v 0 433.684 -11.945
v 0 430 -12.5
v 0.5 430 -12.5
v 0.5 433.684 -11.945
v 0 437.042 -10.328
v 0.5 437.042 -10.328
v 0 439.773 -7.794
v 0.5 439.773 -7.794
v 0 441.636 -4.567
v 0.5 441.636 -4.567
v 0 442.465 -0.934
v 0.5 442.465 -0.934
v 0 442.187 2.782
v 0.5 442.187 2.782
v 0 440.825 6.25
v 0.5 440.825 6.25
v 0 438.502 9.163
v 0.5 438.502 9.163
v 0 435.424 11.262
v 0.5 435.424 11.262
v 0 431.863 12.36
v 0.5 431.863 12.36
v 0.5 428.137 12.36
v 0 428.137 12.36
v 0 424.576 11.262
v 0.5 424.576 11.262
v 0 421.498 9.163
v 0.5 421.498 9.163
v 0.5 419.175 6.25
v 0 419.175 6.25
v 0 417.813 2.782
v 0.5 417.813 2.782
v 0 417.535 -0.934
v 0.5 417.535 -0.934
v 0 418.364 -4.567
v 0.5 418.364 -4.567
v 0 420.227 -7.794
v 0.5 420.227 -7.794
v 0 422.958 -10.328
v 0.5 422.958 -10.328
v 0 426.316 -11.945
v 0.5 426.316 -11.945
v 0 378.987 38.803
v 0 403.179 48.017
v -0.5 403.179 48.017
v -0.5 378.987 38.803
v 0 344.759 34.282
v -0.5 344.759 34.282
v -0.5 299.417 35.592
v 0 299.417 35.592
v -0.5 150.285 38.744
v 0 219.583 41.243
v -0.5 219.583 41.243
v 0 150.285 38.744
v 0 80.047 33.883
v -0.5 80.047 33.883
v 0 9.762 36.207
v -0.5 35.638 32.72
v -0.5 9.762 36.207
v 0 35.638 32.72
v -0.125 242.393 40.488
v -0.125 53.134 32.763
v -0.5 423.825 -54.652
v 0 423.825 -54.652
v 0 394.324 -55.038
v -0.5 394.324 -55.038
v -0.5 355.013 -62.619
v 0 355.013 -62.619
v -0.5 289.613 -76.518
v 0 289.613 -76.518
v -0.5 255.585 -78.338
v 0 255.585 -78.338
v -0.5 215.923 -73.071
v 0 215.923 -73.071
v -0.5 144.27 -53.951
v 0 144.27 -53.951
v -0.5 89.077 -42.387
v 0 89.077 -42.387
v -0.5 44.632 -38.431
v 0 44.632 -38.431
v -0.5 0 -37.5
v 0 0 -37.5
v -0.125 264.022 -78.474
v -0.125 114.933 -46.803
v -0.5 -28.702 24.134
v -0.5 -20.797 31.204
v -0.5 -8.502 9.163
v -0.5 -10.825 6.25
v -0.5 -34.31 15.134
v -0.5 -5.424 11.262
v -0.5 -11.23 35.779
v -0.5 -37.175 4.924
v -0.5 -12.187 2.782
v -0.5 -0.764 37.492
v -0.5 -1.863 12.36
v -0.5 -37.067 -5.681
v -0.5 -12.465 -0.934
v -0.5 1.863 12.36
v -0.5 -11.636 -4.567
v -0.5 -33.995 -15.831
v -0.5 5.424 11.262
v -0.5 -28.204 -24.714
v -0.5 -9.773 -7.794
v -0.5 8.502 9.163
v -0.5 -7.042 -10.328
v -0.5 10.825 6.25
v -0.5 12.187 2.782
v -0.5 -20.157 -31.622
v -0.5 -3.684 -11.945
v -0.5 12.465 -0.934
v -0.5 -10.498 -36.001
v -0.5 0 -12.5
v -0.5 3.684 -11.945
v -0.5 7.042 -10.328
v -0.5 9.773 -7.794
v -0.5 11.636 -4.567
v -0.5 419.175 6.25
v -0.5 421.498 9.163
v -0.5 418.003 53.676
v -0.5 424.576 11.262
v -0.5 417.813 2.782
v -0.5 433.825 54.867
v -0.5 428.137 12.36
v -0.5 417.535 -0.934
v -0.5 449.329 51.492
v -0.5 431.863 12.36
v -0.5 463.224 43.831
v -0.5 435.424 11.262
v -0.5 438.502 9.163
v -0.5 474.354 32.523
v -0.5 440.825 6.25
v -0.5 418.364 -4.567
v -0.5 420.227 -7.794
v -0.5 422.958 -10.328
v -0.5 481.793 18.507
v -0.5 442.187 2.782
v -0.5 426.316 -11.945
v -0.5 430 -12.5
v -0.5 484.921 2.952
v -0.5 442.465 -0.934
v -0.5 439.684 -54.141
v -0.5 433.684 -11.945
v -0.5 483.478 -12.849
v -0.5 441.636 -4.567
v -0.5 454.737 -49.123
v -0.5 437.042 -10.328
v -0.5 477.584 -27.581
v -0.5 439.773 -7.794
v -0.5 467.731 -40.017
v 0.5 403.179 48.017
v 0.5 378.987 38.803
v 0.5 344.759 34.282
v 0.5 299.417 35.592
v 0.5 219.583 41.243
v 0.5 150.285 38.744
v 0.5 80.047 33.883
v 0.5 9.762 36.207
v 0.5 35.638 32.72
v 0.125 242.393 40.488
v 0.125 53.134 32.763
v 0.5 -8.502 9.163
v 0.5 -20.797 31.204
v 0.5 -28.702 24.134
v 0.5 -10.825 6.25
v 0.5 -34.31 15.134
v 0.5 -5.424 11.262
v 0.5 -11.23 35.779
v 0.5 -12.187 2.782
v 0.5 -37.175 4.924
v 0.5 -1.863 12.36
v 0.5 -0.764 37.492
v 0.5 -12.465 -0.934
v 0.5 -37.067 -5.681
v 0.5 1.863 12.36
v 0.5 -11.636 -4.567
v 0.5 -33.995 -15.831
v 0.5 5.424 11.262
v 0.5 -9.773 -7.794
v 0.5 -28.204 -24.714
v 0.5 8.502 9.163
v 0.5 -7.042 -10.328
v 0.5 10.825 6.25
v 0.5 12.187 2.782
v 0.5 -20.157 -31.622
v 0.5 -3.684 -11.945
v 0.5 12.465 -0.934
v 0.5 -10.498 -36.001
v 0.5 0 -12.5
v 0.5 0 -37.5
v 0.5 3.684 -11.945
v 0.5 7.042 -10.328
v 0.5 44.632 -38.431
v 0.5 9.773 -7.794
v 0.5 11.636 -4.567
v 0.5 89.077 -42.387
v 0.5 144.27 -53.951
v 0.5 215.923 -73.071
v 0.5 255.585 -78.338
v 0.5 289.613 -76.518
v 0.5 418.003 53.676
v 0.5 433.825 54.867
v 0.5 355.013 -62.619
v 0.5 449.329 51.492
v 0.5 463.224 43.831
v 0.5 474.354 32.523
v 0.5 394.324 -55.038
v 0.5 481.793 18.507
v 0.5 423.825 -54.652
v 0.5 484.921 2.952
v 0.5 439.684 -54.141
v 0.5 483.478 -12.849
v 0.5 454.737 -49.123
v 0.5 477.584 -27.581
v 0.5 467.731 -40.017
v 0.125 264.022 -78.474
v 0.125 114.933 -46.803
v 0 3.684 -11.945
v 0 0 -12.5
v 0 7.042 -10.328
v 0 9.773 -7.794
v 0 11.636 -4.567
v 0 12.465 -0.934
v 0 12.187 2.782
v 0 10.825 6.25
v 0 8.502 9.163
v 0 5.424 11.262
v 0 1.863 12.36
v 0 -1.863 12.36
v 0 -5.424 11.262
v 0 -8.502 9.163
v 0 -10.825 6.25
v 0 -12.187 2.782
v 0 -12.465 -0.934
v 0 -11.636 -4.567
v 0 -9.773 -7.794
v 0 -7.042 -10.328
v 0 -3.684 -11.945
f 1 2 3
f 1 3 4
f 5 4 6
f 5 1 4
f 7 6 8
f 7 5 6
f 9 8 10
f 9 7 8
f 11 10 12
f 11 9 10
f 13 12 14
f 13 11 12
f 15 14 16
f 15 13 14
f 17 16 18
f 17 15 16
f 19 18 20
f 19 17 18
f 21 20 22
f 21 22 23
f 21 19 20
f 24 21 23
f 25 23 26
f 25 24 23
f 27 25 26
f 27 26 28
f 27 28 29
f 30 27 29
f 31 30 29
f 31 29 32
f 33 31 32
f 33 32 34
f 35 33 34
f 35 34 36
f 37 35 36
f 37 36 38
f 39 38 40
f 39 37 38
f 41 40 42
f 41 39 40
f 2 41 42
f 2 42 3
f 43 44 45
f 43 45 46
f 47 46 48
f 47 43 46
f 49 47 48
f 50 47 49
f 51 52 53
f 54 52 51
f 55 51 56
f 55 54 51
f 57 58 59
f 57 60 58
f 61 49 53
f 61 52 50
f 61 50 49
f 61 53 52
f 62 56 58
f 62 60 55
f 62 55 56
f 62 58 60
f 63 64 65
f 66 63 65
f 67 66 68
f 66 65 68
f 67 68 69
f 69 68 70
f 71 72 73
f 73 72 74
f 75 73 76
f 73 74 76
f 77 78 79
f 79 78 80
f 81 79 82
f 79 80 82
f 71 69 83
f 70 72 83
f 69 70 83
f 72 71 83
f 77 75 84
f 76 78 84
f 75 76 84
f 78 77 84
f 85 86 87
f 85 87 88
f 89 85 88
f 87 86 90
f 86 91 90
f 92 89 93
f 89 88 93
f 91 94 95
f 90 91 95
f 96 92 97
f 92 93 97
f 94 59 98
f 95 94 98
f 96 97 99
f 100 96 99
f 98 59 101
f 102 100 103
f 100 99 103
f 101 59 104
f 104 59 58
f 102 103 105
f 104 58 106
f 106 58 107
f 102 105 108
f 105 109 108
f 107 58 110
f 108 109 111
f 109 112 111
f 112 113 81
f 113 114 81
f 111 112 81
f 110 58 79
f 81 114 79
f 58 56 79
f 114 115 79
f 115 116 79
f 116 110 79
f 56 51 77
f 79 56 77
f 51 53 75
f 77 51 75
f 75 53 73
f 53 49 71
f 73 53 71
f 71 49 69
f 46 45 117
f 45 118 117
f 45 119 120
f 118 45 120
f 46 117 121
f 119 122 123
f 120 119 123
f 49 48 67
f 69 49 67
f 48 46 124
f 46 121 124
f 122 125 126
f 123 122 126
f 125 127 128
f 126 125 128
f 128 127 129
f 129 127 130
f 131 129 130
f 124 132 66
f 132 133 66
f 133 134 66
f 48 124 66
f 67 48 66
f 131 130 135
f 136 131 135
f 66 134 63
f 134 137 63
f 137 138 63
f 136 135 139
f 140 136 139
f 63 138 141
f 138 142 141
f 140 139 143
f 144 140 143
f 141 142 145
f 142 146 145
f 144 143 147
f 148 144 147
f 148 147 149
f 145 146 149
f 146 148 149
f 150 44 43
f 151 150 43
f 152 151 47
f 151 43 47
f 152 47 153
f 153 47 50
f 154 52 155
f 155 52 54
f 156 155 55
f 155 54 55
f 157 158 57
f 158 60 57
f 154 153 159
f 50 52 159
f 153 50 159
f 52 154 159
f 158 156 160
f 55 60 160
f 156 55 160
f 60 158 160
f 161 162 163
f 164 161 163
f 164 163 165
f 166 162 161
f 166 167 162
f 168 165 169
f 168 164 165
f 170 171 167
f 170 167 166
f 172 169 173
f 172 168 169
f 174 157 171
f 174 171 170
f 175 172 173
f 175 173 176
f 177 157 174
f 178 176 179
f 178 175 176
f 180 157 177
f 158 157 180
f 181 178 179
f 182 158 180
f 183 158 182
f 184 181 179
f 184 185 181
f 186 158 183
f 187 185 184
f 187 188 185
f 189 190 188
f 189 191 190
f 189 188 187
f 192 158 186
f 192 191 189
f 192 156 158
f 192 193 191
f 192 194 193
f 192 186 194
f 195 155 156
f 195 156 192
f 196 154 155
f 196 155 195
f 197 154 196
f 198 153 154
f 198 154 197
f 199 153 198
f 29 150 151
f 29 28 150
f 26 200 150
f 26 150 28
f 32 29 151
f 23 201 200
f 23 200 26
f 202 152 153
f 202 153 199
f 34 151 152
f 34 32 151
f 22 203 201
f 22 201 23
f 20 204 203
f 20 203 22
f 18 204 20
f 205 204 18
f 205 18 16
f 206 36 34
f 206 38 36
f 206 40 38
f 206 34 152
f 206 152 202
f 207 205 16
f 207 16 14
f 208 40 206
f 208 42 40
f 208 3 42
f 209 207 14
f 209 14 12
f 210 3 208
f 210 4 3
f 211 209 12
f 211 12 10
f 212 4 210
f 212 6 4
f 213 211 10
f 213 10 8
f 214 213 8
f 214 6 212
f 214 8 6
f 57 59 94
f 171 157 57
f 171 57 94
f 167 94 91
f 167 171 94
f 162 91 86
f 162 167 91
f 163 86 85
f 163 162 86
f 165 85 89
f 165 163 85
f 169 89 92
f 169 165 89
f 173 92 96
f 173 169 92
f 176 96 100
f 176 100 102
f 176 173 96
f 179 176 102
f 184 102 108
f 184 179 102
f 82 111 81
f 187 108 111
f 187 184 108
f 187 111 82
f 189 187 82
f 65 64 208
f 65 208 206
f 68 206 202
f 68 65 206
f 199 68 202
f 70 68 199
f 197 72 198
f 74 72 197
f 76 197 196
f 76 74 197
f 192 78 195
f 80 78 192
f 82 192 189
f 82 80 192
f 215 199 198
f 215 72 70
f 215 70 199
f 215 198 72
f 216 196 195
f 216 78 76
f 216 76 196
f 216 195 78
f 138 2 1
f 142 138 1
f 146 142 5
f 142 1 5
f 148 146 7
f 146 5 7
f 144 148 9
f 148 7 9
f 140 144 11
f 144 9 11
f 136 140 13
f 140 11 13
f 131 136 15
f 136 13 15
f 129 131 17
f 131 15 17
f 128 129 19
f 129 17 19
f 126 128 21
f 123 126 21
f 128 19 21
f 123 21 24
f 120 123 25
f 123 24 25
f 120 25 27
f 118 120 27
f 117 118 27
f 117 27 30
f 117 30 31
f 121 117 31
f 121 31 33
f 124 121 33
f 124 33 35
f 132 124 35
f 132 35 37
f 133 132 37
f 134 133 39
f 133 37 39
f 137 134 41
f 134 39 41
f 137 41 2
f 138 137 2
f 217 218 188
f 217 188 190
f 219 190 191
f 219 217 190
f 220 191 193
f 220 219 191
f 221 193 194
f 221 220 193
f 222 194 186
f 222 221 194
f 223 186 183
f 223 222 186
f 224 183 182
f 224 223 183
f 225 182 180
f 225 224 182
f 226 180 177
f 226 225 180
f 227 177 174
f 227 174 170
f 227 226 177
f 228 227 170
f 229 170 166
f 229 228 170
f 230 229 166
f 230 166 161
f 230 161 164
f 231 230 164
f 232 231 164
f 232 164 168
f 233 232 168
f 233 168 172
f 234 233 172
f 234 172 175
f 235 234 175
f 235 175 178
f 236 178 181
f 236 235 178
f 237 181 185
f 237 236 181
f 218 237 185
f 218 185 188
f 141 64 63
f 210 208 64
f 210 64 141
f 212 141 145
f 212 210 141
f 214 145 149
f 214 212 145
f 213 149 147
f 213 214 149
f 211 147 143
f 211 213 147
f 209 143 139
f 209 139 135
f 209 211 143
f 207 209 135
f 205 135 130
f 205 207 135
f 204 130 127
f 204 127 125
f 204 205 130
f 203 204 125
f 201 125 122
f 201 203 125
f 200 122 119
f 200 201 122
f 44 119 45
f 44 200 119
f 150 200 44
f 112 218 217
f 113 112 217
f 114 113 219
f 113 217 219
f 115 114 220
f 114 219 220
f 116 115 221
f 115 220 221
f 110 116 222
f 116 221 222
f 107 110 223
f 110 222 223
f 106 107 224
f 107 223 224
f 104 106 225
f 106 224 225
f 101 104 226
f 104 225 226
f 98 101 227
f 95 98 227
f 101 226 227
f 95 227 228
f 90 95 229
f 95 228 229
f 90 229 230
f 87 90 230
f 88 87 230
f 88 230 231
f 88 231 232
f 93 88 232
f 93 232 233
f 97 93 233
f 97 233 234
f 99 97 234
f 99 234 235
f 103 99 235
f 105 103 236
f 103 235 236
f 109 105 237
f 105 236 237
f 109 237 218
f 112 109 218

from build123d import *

# Parameters (mm, degrees)
SKETCH3_R      = 12.5
EXTRUDE1_DEPTH = 0.5


with BuildPart() as part:
    # Sketch3 → Extrude1 (new, symmetric)
    with BuildSketch(Plane(origin=(0, 0, 0), x_dir=(0, 0, -1), z_dir=(1, 0, 0))):
        with BuildLine():
            ThreePointArc((-36.207031651, 9.762215886), (-4.923734004, -37.175352634), (37.5, 0))
            add(Edge.make_bspline(
                [(54.652290082, 423.825278241), (52.509509177, 404.859584217), (61.688430189, 350.928455024), (93.740739008, 248.146468923), (40.812256209, 127.830390939), (37.5, 38.493002207), (37.5, 0)],
                knots=[0, 0, 0, 0, 0.133447201, 0.376558764, 0.731484898, 1, 1, 1, 1], degree=3))
            ThreePointArc((54.652290082, 423.825278241), (-10.84310867, 483.920561889), (-48.017058979, 403.179074456))
            add(Edge.make_bspline(
                [(-48.017058979, 403.179074456), (-41.112444302, 390.817857106), (-27.905320028, 336.914546659), (-50.20843212, 219.173527848), (-32.204632677, 102.502128563), (-32.423669788, 23.794306992), (-36.207031651, 9.762215886)],
                knots=[0, 0, 0, 0, 0.106358982, 0.411206468, 0.890017974, 1, 1, 1, 1], degree=3))
        make_face()
        with Locations((0, 430)):
            Circle(SKETCH3_R, mode=Mode.SUBTRACT)
        Circle(SKETCH3_R, mode=Mode.SUBTRACT)
    extrude(amount=EXTRUDE1_DEPTH, both=True)


solid = part.part
